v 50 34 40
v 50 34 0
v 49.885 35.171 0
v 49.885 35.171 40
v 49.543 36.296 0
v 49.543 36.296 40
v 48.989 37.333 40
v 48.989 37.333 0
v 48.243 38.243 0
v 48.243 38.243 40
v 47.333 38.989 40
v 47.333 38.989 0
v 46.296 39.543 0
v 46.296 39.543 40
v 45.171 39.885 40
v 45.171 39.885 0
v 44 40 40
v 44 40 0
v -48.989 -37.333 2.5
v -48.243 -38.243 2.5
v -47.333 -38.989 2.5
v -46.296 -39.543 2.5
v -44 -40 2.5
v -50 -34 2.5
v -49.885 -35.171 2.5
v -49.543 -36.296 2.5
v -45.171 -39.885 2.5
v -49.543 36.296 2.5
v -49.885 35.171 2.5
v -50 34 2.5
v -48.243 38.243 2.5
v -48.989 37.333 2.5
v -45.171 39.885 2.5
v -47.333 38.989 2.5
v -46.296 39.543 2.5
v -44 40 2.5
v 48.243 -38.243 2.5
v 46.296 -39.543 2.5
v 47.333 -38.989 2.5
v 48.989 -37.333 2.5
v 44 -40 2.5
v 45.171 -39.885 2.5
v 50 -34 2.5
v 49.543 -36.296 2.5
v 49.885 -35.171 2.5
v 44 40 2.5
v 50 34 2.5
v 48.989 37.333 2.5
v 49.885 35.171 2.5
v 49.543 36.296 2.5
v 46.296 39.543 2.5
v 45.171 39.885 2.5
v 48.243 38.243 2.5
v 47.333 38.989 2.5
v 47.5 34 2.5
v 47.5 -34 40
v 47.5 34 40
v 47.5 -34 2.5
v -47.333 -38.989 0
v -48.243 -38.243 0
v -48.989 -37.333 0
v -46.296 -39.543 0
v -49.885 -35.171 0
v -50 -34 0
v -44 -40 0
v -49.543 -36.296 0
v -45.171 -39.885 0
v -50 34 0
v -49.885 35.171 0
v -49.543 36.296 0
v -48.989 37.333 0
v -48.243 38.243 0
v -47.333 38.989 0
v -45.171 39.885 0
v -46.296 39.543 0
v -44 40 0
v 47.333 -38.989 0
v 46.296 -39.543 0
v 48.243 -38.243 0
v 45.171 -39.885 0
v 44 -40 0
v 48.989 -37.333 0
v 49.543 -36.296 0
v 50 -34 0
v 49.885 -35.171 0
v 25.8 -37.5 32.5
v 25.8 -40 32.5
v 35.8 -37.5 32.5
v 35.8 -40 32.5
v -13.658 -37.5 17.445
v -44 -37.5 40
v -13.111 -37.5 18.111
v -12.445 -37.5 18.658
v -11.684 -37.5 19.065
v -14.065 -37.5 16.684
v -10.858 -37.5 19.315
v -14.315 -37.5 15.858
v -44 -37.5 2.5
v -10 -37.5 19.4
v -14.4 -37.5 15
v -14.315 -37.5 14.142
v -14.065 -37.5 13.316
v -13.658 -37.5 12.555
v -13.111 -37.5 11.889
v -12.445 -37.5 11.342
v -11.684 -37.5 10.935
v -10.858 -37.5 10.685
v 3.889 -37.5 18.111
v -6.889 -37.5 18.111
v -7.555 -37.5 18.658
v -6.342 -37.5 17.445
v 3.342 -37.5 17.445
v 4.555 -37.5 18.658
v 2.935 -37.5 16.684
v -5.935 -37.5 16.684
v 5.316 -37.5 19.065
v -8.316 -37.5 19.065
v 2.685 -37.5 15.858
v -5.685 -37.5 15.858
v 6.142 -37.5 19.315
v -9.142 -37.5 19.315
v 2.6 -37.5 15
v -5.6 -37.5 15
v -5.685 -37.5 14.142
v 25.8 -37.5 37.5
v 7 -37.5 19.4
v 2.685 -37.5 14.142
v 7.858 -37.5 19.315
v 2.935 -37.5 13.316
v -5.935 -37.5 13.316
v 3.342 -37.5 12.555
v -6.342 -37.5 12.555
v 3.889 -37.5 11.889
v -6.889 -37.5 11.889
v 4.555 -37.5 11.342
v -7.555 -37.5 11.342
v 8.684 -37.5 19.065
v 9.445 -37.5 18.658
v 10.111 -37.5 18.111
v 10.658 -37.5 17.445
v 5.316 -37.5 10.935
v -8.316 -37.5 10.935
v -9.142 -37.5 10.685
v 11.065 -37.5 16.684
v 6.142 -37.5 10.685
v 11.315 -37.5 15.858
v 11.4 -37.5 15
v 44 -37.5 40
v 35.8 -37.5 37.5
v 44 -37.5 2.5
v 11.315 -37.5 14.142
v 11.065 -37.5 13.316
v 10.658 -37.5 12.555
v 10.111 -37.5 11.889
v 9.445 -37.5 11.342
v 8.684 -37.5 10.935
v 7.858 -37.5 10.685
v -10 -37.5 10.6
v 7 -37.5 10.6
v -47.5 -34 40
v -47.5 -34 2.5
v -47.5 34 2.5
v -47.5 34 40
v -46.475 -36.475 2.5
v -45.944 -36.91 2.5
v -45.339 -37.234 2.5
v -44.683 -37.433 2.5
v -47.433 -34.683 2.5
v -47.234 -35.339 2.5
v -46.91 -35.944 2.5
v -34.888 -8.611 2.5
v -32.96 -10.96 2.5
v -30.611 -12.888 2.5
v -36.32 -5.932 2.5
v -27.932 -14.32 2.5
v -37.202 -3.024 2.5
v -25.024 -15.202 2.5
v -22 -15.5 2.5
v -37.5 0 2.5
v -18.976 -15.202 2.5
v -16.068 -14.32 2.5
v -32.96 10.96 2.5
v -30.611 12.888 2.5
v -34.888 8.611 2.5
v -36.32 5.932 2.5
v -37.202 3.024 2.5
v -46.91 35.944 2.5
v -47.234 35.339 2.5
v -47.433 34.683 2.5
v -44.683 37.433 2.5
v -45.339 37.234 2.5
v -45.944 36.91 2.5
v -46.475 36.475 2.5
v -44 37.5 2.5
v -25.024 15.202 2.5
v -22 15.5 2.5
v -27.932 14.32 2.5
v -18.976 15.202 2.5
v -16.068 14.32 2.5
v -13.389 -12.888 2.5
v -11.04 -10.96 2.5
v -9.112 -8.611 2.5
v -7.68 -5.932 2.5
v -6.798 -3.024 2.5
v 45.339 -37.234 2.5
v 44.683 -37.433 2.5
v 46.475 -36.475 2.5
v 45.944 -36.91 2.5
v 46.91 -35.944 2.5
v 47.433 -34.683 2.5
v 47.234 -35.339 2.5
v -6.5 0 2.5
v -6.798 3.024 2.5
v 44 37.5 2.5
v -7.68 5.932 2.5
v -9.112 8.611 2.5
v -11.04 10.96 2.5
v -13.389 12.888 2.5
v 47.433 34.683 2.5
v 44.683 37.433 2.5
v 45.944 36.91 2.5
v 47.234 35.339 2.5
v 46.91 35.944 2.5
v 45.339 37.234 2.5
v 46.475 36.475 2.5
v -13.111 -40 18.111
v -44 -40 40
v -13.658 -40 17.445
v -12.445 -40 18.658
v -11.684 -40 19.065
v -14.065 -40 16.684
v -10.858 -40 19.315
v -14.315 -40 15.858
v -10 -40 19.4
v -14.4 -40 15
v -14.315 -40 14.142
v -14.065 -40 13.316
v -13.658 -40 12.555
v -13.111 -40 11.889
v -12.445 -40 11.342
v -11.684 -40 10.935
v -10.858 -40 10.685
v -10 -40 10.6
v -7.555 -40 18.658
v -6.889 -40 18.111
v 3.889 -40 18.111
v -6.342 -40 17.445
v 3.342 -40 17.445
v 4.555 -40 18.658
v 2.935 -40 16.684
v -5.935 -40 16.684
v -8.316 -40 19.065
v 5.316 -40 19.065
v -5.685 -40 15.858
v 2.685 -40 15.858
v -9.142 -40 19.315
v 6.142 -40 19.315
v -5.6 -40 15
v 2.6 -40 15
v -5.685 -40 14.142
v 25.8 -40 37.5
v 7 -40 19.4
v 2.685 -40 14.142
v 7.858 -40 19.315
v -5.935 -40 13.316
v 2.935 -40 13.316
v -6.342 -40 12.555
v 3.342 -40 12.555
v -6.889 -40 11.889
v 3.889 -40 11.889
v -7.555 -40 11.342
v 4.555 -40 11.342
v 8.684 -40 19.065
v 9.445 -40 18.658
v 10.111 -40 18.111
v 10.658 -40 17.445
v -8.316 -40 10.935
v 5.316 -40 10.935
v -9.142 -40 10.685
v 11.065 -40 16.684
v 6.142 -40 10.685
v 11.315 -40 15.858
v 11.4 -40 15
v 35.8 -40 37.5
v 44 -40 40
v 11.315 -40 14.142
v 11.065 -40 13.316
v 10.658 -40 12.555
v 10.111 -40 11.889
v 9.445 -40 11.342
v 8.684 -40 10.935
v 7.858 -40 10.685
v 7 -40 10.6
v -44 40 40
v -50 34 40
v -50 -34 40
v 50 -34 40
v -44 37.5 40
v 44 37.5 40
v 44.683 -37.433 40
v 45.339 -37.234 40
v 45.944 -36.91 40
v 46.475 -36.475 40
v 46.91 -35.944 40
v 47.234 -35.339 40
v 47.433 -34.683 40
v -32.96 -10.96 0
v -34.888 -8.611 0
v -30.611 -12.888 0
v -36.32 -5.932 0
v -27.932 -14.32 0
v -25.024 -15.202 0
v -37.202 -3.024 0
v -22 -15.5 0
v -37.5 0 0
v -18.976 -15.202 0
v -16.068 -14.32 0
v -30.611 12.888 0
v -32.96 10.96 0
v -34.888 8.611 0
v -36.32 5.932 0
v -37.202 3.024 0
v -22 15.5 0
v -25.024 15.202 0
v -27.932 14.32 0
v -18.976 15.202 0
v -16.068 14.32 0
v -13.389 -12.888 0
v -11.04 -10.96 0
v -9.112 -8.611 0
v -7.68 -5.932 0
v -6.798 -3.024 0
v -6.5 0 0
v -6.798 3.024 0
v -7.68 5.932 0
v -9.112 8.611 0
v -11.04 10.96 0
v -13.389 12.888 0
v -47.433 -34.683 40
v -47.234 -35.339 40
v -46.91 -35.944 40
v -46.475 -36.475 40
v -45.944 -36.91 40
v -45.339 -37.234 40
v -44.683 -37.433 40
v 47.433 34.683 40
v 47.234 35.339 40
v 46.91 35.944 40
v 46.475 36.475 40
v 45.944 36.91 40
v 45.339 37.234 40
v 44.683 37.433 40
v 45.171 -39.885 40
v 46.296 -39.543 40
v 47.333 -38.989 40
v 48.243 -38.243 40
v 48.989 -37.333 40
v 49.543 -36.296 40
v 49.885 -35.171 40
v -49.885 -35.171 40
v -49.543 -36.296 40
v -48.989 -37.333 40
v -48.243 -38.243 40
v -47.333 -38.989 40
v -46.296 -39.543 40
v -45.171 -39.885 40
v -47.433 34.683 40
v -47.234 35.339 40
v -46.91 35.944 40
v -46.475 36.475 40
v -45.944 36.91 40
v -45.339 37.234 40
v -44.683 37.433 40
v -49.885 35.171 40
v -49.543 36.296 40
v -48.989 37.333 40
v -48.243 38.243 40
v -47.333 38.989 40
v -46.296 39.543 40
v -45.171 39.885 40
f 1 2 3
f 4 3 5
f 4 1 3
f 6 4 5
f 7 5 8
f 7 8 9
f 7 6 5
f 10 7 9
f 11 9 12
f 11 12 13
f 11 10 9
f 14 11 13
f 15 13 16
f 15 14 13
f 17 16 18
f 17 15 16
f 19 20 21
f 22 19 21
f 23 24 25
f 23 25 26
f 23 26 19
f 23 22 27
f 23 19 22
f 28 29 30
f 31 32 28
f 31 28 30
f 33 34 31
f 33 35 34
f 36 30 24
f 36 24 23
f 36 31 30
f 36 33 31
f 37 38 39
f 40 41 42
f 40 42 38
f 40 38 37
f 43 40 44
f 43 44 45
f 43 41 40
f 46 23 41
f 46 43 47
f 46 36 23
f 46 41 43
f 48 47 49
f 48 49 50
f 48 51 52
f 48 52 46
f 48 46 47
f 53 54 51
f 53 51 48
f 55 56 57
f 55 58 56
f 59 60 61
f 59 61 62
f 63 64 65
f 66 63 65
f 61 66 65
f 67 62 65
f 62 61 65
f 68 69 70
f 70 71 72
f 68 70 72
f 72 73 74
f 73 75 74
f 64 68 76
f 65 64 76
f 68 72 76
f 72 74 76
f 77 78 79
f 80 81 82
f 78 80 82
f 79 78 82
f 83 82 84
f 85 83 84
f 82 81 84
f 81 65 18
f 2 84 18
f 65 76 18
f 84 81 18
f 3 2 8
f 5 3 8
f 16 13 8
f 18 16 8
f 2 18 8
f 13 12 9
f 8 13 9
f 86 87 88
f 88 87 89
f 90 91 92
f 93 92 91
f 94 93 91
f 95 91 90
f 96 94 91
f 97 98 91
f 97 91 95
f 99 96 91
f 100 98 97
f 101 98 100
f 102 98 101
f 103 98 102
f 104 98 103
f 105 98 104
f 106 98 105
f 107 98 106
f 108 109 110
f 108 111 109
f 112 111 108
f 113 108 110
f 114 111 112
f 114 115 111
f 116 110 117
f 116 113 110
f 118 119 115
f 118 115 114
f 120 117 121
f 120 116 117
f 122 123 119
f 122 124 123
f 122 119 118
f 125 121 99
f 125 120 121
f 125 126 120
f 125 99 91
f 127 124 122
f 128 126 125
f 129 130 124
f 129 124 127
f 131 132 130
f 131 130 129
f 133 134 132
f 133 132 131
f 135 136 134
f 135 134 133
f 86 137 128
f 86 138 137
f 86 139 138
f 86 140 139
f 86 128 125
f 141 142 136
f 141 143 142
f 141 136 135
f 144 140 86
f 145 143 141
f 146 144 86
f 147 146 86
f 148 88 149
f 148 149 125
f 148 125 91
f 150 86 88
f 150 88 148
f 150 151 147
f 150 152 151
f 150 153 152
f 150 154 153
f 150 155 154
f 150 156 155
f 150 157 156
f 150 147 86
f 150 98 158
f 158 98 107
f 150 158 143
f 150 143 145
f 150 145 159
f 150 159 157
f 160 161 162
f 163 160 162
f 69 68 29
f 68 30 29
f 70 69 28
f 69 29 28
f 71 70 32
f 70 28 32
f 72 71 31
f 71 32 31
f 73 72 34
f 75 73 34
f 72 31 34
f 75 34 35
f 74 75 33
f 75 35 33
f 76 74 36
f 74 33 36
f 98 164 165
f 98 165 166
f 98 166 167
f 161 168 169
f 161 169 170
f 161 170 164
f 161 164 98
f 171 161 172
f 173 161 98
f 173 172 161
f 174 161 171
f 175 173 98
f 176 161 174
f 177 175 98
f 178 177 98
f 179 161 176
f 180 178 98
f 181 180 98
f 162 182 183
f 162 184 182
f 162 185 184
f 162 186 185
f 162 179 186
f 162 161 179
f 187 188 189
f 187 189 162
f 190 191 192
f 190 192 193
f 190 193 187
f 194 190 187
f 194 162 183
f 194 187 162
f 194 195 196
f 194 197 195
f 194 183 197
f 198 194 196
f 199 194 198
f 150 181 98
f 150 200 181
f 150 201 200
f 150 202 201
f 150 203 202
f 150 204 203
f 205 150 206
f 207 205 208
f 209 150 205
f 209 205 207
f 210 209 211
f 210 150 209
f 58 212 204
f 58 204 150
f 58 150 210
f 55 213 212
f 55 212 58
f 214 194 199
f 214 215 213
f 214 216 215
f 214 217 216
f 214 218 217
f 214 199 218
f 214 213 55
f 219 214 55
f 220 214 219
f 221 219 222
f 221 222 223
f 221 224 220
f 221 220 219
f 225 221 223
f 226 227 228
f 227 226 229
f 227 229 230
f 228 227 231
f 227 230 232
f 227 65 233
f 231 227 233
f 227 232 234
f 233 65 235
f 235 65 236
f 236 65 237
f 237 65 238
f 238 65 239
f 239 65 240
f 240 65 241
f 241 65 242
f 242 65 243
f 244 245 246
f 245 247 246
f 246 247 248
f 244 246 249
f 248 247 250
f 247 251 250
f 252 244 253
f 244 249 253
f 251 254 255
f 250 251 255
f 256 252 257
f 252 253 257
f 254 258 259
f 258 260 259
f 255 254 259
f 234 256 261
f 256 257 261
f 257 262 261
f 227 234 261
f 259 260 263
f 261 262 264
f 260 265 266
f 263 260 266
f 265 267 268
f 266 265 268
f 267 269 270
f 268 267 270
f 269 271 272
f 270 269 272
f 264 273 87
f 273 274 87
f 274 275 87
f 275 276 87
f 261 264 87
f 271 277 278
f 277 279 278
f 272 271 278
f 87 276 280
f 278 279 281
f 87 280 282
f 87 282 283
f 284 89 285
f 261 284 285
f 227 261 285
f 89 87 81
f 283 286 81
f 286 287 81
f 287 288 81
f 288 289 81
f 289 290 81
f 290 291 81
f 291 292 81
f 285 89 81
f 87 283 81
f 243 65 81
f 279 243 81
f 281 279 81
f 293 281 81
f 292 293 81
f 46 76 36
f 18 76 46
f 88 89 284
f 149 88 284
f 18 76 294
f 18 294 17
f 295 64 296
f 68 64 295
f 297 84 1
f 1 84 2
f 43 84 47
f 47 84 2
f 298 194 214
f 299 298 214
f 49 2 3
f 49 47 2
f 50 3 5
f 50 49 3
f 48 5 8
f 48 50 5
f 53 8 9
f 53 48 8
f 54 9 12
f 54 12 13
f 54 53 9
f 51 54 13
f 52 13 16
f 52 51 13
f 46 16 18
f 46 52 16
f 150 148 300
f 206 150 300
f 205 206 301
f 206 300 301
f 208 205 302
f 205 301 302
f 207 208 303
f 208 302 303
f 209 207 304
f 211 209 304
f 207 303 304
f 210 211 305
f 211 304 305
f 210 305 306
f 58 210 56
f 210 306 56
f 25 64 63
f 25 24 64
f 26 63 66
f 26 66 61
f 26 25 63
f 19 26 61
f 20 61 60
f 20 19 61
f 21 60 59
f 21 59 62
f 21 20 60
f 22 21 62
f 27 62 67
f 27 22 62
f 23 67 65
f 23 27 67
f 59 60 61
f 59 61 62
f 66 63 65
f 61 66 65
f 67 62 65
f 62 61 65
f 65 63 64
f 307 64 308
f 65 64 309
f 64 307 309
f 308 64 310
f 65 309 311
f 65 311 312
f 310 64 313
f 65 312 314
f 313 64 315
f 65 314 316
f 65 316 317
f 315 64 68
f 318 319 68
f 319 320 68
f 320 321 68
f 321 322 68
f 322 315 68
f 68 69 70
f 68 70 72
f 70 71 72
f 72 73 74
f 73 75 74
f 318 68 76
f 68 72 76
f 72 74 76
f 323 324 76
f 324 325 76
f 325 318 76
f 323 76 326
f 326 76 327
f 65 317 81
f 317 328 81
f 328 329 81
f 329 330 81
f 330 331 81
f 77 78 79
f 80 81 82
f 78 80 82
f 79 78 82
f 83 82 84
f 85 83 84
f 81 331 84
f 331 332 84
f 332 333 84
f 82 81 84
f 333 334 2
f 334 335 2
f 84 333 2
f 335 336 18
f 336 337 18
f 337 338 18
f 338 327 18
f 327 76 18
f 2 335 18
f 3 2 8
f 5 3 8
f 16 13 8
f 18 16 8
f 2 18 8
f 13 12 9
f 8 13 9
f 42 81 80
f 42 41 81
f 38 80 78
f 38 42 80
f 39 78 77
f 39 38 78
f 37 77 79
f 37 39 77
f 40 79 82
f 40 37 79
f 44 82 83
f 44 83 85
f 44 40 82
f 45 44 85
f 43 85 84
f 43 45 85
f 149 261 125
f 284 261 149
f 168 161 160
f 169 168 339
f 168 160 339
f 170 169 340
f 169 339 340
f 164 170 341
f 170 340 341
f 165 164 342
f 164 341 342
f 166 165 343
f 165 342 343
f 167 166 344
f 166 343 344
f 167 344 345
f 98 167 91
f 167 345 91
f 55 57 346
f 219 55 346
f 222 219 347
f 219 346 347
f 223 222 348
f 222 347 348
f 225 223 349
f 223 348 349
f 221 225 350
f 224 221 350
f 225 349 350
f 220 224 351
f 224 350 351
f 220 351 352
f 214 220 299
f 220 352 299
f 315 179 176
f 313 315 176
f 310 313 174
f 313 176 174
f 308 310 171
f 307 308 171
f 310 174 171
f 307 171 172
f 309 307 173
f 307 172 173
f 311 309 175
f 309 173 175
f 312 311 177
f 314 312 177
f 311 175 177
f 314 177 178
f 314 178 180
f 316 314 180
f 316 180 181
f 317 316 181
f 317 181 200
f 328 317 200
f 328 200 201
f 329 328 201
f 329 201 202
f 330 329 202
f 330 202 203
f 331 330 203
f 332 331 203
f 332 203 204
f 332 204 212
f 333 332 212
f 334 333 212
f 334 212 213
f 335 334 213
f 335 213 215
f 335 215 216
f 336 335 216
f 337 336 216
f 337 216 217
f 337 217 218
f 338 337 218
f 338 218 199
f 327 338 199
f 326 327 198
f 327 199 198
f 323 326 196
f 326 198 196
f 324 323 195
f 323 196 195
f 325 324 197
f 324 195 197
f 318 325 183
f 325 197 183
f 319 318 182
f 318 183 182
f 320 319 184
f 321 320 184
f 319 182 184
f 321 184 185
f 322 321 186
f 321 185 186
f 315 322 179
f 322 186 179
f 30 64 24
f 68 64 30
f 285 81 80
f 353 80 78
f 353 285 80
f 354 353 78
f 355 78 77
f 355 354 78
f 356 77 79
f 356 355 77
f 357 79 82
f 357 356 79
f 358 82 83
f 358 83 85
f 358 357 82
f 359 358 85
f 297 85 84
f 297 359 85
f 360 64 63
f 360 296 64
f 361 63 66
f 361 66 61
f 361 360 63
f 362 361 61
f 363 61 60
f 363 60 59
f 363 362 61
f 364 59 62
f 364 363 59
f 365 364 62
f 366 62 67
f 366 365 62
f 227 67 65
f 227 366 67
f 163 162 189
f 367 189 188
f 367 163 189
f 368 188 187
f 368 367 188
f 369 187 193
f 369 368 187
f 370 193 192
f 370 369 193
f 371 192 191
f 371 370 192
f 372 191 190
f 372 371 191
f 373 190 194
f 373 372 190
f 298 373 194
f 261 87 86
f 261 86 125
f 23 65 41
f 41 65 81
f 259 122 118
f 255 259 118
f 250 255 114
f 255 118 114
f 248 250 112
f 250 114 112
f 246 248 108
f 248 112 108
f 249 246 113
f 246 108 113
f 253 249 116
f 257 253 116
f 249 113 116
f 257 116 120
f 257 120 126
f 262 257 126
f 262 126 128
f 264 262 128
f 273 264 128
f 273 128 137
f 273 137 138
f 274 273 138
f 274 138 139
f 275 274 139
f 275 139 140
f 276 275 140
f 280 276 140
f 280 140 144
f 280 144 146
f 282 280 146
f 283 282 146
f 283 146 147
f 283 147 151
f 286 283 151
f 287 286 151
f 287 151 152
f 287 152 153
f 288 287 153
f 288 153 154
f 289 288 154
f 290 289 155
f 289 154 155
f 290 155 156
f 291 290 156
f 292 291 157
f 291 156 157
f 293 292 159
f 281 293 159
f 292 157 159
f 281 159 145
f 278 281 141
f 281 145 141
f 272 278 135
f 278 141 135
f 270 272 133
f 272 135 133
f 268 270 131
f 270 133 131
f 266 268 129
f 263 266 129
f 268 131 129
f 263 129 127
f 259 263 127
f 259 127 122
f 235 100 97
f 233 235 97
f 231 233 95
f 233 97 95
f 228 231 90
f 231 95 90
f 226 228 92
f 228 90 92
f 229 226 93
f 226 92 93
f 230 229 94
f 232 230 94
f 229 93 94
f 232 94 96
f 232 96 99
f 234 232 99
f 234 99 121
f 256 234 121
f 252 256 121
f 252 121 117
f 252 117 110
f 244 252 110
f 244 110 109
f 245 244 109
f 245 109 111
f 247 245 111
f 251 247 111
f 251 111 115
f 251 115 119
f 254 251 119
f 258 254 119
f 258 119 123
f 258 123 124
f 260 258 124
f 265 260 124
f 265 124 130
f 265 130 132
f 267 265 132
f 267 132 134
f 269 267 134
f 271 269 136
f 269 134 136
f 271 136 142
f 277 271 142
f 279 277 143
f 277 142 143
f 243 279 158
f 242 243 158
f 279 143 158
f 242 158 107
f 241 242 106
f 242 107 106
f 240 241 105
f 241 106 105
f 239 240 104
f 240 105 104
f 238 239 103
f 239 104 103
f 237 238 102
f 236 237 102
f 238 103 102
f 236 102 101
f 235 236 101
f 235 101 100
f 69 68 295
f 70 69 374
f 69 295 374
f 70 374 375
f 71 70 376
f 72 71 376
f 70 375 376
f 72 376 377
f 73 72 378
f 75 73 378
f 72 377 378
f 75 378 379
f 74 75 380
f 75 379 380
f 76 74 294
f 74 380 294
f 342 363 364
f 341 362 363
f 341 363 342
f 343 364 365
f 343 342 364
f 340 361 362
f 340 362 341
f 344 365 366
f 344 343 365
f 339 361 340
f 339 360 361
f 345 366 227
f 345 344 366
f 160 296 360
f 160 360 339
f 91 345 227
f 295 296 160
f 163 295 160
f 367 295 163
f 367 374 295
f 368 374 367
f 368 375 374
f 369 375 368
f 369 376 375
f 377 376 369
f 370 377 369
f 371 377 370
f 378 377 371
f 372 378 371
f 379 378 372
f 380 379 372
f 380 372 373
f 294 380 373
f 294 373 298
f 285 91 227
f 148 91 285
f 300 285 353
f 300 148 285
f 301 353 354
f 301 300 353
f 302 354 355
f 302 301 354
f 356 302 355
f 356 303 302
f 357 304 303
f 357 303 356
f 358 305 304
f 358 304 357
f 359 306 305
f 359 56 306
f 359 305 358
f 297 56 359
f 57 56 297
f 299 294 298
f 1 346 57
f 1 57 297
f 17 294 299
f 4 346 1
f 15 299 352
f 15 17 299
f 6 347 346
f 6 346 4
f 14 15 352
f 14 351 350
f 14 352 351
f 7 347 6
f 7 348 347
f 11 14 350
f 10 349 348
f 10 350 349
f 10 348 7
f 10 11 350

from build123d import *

# Parameters (mm, degrees)
F0_W      = 100
F0_H      = 80
F1_DEPTH  = 40
F2_R      = 6
F3_T      = -2.5
F5_D      = 31
F7_D      = 8.8
F7_DEPTH  = 5
F7_TIP    = 2.6437867237
F8_W      = 10
F8_H      = 5
F9_DEPTH  = 2.5
F10_DEPTH = 2.5
F11_R     = 6


with BuildPart() as f1:
    # F0 (on Top) → F1 (new body)
    with BuildSketch(Plane.XY):
        Rectangle(F0_W, F0_H)
    extrude(amount=F1_DEPTH)

    # F2
    f2_edges = [f1.edges().sort_by_distance(p)[0] for p in [
        (-50, -40, 20),
        (50, -40, 20),
        (50, 40, 20),
        (-50, 40, 20),
    ]]
    fillet(f2_edges, radius=F2_R)

    # F3
    f3_openings = [f1.faces().sort_by_distance(p)[0] for p in [
        (0, 0, 40),
    ]]
    offset(amount=F3_T, openings=f3_openings)

    # F5 (through all)
    with Locations(Plane(origin=(0, 0, 0), x_dir=(1, 0, 0), z_dir=(0, 0, -1))):
        with Locations((-22, 0)):
            Hole(F5_D / 2)

    # F7
    with Locations(Plane.XZ.offset(40)):
        with Locations((-10, 15), (7, 15)):
            Hole(F7_D / 2, depth=F7_DEPTH)
            with Locations((0, 0, -(F7_DEPTH + F7_TIP / 2))):  # 118° drill point
                Cone(0, F7_D / 2, F7_TIP, mode=Mode.SUBTRACT)

    # F8 (on face) → F9 (cut, through all)
    with BuildSketch(Plane.XZ.offset(40)):
        with Locations((30.8, 35)):
            Rectangle(F8_W, F8_H)
    extrude(amount=-F9_DEPTH, mode=Mode.SUBTRACT)


with BuildPart() as f10:
    # F0 (on Top) → F10 (new body)
    with BuildSketch(Plane.XY):
        Rectangle(F0_W, F0_H)
    extrude(amount=F10_DEPTH)

    # F11
    f11_edges = [f10.edges().sort_by_distance(p)[0] for p in [
        (50, -40, 1.25),
        (50, 40, 1.25),
        (-50, -40, 1.25),
        (-50, 40, 1.25),
    ]]
    fillet(f11_edges, radius=F11_R)


solid = Compound([f1.part, f10.part])
